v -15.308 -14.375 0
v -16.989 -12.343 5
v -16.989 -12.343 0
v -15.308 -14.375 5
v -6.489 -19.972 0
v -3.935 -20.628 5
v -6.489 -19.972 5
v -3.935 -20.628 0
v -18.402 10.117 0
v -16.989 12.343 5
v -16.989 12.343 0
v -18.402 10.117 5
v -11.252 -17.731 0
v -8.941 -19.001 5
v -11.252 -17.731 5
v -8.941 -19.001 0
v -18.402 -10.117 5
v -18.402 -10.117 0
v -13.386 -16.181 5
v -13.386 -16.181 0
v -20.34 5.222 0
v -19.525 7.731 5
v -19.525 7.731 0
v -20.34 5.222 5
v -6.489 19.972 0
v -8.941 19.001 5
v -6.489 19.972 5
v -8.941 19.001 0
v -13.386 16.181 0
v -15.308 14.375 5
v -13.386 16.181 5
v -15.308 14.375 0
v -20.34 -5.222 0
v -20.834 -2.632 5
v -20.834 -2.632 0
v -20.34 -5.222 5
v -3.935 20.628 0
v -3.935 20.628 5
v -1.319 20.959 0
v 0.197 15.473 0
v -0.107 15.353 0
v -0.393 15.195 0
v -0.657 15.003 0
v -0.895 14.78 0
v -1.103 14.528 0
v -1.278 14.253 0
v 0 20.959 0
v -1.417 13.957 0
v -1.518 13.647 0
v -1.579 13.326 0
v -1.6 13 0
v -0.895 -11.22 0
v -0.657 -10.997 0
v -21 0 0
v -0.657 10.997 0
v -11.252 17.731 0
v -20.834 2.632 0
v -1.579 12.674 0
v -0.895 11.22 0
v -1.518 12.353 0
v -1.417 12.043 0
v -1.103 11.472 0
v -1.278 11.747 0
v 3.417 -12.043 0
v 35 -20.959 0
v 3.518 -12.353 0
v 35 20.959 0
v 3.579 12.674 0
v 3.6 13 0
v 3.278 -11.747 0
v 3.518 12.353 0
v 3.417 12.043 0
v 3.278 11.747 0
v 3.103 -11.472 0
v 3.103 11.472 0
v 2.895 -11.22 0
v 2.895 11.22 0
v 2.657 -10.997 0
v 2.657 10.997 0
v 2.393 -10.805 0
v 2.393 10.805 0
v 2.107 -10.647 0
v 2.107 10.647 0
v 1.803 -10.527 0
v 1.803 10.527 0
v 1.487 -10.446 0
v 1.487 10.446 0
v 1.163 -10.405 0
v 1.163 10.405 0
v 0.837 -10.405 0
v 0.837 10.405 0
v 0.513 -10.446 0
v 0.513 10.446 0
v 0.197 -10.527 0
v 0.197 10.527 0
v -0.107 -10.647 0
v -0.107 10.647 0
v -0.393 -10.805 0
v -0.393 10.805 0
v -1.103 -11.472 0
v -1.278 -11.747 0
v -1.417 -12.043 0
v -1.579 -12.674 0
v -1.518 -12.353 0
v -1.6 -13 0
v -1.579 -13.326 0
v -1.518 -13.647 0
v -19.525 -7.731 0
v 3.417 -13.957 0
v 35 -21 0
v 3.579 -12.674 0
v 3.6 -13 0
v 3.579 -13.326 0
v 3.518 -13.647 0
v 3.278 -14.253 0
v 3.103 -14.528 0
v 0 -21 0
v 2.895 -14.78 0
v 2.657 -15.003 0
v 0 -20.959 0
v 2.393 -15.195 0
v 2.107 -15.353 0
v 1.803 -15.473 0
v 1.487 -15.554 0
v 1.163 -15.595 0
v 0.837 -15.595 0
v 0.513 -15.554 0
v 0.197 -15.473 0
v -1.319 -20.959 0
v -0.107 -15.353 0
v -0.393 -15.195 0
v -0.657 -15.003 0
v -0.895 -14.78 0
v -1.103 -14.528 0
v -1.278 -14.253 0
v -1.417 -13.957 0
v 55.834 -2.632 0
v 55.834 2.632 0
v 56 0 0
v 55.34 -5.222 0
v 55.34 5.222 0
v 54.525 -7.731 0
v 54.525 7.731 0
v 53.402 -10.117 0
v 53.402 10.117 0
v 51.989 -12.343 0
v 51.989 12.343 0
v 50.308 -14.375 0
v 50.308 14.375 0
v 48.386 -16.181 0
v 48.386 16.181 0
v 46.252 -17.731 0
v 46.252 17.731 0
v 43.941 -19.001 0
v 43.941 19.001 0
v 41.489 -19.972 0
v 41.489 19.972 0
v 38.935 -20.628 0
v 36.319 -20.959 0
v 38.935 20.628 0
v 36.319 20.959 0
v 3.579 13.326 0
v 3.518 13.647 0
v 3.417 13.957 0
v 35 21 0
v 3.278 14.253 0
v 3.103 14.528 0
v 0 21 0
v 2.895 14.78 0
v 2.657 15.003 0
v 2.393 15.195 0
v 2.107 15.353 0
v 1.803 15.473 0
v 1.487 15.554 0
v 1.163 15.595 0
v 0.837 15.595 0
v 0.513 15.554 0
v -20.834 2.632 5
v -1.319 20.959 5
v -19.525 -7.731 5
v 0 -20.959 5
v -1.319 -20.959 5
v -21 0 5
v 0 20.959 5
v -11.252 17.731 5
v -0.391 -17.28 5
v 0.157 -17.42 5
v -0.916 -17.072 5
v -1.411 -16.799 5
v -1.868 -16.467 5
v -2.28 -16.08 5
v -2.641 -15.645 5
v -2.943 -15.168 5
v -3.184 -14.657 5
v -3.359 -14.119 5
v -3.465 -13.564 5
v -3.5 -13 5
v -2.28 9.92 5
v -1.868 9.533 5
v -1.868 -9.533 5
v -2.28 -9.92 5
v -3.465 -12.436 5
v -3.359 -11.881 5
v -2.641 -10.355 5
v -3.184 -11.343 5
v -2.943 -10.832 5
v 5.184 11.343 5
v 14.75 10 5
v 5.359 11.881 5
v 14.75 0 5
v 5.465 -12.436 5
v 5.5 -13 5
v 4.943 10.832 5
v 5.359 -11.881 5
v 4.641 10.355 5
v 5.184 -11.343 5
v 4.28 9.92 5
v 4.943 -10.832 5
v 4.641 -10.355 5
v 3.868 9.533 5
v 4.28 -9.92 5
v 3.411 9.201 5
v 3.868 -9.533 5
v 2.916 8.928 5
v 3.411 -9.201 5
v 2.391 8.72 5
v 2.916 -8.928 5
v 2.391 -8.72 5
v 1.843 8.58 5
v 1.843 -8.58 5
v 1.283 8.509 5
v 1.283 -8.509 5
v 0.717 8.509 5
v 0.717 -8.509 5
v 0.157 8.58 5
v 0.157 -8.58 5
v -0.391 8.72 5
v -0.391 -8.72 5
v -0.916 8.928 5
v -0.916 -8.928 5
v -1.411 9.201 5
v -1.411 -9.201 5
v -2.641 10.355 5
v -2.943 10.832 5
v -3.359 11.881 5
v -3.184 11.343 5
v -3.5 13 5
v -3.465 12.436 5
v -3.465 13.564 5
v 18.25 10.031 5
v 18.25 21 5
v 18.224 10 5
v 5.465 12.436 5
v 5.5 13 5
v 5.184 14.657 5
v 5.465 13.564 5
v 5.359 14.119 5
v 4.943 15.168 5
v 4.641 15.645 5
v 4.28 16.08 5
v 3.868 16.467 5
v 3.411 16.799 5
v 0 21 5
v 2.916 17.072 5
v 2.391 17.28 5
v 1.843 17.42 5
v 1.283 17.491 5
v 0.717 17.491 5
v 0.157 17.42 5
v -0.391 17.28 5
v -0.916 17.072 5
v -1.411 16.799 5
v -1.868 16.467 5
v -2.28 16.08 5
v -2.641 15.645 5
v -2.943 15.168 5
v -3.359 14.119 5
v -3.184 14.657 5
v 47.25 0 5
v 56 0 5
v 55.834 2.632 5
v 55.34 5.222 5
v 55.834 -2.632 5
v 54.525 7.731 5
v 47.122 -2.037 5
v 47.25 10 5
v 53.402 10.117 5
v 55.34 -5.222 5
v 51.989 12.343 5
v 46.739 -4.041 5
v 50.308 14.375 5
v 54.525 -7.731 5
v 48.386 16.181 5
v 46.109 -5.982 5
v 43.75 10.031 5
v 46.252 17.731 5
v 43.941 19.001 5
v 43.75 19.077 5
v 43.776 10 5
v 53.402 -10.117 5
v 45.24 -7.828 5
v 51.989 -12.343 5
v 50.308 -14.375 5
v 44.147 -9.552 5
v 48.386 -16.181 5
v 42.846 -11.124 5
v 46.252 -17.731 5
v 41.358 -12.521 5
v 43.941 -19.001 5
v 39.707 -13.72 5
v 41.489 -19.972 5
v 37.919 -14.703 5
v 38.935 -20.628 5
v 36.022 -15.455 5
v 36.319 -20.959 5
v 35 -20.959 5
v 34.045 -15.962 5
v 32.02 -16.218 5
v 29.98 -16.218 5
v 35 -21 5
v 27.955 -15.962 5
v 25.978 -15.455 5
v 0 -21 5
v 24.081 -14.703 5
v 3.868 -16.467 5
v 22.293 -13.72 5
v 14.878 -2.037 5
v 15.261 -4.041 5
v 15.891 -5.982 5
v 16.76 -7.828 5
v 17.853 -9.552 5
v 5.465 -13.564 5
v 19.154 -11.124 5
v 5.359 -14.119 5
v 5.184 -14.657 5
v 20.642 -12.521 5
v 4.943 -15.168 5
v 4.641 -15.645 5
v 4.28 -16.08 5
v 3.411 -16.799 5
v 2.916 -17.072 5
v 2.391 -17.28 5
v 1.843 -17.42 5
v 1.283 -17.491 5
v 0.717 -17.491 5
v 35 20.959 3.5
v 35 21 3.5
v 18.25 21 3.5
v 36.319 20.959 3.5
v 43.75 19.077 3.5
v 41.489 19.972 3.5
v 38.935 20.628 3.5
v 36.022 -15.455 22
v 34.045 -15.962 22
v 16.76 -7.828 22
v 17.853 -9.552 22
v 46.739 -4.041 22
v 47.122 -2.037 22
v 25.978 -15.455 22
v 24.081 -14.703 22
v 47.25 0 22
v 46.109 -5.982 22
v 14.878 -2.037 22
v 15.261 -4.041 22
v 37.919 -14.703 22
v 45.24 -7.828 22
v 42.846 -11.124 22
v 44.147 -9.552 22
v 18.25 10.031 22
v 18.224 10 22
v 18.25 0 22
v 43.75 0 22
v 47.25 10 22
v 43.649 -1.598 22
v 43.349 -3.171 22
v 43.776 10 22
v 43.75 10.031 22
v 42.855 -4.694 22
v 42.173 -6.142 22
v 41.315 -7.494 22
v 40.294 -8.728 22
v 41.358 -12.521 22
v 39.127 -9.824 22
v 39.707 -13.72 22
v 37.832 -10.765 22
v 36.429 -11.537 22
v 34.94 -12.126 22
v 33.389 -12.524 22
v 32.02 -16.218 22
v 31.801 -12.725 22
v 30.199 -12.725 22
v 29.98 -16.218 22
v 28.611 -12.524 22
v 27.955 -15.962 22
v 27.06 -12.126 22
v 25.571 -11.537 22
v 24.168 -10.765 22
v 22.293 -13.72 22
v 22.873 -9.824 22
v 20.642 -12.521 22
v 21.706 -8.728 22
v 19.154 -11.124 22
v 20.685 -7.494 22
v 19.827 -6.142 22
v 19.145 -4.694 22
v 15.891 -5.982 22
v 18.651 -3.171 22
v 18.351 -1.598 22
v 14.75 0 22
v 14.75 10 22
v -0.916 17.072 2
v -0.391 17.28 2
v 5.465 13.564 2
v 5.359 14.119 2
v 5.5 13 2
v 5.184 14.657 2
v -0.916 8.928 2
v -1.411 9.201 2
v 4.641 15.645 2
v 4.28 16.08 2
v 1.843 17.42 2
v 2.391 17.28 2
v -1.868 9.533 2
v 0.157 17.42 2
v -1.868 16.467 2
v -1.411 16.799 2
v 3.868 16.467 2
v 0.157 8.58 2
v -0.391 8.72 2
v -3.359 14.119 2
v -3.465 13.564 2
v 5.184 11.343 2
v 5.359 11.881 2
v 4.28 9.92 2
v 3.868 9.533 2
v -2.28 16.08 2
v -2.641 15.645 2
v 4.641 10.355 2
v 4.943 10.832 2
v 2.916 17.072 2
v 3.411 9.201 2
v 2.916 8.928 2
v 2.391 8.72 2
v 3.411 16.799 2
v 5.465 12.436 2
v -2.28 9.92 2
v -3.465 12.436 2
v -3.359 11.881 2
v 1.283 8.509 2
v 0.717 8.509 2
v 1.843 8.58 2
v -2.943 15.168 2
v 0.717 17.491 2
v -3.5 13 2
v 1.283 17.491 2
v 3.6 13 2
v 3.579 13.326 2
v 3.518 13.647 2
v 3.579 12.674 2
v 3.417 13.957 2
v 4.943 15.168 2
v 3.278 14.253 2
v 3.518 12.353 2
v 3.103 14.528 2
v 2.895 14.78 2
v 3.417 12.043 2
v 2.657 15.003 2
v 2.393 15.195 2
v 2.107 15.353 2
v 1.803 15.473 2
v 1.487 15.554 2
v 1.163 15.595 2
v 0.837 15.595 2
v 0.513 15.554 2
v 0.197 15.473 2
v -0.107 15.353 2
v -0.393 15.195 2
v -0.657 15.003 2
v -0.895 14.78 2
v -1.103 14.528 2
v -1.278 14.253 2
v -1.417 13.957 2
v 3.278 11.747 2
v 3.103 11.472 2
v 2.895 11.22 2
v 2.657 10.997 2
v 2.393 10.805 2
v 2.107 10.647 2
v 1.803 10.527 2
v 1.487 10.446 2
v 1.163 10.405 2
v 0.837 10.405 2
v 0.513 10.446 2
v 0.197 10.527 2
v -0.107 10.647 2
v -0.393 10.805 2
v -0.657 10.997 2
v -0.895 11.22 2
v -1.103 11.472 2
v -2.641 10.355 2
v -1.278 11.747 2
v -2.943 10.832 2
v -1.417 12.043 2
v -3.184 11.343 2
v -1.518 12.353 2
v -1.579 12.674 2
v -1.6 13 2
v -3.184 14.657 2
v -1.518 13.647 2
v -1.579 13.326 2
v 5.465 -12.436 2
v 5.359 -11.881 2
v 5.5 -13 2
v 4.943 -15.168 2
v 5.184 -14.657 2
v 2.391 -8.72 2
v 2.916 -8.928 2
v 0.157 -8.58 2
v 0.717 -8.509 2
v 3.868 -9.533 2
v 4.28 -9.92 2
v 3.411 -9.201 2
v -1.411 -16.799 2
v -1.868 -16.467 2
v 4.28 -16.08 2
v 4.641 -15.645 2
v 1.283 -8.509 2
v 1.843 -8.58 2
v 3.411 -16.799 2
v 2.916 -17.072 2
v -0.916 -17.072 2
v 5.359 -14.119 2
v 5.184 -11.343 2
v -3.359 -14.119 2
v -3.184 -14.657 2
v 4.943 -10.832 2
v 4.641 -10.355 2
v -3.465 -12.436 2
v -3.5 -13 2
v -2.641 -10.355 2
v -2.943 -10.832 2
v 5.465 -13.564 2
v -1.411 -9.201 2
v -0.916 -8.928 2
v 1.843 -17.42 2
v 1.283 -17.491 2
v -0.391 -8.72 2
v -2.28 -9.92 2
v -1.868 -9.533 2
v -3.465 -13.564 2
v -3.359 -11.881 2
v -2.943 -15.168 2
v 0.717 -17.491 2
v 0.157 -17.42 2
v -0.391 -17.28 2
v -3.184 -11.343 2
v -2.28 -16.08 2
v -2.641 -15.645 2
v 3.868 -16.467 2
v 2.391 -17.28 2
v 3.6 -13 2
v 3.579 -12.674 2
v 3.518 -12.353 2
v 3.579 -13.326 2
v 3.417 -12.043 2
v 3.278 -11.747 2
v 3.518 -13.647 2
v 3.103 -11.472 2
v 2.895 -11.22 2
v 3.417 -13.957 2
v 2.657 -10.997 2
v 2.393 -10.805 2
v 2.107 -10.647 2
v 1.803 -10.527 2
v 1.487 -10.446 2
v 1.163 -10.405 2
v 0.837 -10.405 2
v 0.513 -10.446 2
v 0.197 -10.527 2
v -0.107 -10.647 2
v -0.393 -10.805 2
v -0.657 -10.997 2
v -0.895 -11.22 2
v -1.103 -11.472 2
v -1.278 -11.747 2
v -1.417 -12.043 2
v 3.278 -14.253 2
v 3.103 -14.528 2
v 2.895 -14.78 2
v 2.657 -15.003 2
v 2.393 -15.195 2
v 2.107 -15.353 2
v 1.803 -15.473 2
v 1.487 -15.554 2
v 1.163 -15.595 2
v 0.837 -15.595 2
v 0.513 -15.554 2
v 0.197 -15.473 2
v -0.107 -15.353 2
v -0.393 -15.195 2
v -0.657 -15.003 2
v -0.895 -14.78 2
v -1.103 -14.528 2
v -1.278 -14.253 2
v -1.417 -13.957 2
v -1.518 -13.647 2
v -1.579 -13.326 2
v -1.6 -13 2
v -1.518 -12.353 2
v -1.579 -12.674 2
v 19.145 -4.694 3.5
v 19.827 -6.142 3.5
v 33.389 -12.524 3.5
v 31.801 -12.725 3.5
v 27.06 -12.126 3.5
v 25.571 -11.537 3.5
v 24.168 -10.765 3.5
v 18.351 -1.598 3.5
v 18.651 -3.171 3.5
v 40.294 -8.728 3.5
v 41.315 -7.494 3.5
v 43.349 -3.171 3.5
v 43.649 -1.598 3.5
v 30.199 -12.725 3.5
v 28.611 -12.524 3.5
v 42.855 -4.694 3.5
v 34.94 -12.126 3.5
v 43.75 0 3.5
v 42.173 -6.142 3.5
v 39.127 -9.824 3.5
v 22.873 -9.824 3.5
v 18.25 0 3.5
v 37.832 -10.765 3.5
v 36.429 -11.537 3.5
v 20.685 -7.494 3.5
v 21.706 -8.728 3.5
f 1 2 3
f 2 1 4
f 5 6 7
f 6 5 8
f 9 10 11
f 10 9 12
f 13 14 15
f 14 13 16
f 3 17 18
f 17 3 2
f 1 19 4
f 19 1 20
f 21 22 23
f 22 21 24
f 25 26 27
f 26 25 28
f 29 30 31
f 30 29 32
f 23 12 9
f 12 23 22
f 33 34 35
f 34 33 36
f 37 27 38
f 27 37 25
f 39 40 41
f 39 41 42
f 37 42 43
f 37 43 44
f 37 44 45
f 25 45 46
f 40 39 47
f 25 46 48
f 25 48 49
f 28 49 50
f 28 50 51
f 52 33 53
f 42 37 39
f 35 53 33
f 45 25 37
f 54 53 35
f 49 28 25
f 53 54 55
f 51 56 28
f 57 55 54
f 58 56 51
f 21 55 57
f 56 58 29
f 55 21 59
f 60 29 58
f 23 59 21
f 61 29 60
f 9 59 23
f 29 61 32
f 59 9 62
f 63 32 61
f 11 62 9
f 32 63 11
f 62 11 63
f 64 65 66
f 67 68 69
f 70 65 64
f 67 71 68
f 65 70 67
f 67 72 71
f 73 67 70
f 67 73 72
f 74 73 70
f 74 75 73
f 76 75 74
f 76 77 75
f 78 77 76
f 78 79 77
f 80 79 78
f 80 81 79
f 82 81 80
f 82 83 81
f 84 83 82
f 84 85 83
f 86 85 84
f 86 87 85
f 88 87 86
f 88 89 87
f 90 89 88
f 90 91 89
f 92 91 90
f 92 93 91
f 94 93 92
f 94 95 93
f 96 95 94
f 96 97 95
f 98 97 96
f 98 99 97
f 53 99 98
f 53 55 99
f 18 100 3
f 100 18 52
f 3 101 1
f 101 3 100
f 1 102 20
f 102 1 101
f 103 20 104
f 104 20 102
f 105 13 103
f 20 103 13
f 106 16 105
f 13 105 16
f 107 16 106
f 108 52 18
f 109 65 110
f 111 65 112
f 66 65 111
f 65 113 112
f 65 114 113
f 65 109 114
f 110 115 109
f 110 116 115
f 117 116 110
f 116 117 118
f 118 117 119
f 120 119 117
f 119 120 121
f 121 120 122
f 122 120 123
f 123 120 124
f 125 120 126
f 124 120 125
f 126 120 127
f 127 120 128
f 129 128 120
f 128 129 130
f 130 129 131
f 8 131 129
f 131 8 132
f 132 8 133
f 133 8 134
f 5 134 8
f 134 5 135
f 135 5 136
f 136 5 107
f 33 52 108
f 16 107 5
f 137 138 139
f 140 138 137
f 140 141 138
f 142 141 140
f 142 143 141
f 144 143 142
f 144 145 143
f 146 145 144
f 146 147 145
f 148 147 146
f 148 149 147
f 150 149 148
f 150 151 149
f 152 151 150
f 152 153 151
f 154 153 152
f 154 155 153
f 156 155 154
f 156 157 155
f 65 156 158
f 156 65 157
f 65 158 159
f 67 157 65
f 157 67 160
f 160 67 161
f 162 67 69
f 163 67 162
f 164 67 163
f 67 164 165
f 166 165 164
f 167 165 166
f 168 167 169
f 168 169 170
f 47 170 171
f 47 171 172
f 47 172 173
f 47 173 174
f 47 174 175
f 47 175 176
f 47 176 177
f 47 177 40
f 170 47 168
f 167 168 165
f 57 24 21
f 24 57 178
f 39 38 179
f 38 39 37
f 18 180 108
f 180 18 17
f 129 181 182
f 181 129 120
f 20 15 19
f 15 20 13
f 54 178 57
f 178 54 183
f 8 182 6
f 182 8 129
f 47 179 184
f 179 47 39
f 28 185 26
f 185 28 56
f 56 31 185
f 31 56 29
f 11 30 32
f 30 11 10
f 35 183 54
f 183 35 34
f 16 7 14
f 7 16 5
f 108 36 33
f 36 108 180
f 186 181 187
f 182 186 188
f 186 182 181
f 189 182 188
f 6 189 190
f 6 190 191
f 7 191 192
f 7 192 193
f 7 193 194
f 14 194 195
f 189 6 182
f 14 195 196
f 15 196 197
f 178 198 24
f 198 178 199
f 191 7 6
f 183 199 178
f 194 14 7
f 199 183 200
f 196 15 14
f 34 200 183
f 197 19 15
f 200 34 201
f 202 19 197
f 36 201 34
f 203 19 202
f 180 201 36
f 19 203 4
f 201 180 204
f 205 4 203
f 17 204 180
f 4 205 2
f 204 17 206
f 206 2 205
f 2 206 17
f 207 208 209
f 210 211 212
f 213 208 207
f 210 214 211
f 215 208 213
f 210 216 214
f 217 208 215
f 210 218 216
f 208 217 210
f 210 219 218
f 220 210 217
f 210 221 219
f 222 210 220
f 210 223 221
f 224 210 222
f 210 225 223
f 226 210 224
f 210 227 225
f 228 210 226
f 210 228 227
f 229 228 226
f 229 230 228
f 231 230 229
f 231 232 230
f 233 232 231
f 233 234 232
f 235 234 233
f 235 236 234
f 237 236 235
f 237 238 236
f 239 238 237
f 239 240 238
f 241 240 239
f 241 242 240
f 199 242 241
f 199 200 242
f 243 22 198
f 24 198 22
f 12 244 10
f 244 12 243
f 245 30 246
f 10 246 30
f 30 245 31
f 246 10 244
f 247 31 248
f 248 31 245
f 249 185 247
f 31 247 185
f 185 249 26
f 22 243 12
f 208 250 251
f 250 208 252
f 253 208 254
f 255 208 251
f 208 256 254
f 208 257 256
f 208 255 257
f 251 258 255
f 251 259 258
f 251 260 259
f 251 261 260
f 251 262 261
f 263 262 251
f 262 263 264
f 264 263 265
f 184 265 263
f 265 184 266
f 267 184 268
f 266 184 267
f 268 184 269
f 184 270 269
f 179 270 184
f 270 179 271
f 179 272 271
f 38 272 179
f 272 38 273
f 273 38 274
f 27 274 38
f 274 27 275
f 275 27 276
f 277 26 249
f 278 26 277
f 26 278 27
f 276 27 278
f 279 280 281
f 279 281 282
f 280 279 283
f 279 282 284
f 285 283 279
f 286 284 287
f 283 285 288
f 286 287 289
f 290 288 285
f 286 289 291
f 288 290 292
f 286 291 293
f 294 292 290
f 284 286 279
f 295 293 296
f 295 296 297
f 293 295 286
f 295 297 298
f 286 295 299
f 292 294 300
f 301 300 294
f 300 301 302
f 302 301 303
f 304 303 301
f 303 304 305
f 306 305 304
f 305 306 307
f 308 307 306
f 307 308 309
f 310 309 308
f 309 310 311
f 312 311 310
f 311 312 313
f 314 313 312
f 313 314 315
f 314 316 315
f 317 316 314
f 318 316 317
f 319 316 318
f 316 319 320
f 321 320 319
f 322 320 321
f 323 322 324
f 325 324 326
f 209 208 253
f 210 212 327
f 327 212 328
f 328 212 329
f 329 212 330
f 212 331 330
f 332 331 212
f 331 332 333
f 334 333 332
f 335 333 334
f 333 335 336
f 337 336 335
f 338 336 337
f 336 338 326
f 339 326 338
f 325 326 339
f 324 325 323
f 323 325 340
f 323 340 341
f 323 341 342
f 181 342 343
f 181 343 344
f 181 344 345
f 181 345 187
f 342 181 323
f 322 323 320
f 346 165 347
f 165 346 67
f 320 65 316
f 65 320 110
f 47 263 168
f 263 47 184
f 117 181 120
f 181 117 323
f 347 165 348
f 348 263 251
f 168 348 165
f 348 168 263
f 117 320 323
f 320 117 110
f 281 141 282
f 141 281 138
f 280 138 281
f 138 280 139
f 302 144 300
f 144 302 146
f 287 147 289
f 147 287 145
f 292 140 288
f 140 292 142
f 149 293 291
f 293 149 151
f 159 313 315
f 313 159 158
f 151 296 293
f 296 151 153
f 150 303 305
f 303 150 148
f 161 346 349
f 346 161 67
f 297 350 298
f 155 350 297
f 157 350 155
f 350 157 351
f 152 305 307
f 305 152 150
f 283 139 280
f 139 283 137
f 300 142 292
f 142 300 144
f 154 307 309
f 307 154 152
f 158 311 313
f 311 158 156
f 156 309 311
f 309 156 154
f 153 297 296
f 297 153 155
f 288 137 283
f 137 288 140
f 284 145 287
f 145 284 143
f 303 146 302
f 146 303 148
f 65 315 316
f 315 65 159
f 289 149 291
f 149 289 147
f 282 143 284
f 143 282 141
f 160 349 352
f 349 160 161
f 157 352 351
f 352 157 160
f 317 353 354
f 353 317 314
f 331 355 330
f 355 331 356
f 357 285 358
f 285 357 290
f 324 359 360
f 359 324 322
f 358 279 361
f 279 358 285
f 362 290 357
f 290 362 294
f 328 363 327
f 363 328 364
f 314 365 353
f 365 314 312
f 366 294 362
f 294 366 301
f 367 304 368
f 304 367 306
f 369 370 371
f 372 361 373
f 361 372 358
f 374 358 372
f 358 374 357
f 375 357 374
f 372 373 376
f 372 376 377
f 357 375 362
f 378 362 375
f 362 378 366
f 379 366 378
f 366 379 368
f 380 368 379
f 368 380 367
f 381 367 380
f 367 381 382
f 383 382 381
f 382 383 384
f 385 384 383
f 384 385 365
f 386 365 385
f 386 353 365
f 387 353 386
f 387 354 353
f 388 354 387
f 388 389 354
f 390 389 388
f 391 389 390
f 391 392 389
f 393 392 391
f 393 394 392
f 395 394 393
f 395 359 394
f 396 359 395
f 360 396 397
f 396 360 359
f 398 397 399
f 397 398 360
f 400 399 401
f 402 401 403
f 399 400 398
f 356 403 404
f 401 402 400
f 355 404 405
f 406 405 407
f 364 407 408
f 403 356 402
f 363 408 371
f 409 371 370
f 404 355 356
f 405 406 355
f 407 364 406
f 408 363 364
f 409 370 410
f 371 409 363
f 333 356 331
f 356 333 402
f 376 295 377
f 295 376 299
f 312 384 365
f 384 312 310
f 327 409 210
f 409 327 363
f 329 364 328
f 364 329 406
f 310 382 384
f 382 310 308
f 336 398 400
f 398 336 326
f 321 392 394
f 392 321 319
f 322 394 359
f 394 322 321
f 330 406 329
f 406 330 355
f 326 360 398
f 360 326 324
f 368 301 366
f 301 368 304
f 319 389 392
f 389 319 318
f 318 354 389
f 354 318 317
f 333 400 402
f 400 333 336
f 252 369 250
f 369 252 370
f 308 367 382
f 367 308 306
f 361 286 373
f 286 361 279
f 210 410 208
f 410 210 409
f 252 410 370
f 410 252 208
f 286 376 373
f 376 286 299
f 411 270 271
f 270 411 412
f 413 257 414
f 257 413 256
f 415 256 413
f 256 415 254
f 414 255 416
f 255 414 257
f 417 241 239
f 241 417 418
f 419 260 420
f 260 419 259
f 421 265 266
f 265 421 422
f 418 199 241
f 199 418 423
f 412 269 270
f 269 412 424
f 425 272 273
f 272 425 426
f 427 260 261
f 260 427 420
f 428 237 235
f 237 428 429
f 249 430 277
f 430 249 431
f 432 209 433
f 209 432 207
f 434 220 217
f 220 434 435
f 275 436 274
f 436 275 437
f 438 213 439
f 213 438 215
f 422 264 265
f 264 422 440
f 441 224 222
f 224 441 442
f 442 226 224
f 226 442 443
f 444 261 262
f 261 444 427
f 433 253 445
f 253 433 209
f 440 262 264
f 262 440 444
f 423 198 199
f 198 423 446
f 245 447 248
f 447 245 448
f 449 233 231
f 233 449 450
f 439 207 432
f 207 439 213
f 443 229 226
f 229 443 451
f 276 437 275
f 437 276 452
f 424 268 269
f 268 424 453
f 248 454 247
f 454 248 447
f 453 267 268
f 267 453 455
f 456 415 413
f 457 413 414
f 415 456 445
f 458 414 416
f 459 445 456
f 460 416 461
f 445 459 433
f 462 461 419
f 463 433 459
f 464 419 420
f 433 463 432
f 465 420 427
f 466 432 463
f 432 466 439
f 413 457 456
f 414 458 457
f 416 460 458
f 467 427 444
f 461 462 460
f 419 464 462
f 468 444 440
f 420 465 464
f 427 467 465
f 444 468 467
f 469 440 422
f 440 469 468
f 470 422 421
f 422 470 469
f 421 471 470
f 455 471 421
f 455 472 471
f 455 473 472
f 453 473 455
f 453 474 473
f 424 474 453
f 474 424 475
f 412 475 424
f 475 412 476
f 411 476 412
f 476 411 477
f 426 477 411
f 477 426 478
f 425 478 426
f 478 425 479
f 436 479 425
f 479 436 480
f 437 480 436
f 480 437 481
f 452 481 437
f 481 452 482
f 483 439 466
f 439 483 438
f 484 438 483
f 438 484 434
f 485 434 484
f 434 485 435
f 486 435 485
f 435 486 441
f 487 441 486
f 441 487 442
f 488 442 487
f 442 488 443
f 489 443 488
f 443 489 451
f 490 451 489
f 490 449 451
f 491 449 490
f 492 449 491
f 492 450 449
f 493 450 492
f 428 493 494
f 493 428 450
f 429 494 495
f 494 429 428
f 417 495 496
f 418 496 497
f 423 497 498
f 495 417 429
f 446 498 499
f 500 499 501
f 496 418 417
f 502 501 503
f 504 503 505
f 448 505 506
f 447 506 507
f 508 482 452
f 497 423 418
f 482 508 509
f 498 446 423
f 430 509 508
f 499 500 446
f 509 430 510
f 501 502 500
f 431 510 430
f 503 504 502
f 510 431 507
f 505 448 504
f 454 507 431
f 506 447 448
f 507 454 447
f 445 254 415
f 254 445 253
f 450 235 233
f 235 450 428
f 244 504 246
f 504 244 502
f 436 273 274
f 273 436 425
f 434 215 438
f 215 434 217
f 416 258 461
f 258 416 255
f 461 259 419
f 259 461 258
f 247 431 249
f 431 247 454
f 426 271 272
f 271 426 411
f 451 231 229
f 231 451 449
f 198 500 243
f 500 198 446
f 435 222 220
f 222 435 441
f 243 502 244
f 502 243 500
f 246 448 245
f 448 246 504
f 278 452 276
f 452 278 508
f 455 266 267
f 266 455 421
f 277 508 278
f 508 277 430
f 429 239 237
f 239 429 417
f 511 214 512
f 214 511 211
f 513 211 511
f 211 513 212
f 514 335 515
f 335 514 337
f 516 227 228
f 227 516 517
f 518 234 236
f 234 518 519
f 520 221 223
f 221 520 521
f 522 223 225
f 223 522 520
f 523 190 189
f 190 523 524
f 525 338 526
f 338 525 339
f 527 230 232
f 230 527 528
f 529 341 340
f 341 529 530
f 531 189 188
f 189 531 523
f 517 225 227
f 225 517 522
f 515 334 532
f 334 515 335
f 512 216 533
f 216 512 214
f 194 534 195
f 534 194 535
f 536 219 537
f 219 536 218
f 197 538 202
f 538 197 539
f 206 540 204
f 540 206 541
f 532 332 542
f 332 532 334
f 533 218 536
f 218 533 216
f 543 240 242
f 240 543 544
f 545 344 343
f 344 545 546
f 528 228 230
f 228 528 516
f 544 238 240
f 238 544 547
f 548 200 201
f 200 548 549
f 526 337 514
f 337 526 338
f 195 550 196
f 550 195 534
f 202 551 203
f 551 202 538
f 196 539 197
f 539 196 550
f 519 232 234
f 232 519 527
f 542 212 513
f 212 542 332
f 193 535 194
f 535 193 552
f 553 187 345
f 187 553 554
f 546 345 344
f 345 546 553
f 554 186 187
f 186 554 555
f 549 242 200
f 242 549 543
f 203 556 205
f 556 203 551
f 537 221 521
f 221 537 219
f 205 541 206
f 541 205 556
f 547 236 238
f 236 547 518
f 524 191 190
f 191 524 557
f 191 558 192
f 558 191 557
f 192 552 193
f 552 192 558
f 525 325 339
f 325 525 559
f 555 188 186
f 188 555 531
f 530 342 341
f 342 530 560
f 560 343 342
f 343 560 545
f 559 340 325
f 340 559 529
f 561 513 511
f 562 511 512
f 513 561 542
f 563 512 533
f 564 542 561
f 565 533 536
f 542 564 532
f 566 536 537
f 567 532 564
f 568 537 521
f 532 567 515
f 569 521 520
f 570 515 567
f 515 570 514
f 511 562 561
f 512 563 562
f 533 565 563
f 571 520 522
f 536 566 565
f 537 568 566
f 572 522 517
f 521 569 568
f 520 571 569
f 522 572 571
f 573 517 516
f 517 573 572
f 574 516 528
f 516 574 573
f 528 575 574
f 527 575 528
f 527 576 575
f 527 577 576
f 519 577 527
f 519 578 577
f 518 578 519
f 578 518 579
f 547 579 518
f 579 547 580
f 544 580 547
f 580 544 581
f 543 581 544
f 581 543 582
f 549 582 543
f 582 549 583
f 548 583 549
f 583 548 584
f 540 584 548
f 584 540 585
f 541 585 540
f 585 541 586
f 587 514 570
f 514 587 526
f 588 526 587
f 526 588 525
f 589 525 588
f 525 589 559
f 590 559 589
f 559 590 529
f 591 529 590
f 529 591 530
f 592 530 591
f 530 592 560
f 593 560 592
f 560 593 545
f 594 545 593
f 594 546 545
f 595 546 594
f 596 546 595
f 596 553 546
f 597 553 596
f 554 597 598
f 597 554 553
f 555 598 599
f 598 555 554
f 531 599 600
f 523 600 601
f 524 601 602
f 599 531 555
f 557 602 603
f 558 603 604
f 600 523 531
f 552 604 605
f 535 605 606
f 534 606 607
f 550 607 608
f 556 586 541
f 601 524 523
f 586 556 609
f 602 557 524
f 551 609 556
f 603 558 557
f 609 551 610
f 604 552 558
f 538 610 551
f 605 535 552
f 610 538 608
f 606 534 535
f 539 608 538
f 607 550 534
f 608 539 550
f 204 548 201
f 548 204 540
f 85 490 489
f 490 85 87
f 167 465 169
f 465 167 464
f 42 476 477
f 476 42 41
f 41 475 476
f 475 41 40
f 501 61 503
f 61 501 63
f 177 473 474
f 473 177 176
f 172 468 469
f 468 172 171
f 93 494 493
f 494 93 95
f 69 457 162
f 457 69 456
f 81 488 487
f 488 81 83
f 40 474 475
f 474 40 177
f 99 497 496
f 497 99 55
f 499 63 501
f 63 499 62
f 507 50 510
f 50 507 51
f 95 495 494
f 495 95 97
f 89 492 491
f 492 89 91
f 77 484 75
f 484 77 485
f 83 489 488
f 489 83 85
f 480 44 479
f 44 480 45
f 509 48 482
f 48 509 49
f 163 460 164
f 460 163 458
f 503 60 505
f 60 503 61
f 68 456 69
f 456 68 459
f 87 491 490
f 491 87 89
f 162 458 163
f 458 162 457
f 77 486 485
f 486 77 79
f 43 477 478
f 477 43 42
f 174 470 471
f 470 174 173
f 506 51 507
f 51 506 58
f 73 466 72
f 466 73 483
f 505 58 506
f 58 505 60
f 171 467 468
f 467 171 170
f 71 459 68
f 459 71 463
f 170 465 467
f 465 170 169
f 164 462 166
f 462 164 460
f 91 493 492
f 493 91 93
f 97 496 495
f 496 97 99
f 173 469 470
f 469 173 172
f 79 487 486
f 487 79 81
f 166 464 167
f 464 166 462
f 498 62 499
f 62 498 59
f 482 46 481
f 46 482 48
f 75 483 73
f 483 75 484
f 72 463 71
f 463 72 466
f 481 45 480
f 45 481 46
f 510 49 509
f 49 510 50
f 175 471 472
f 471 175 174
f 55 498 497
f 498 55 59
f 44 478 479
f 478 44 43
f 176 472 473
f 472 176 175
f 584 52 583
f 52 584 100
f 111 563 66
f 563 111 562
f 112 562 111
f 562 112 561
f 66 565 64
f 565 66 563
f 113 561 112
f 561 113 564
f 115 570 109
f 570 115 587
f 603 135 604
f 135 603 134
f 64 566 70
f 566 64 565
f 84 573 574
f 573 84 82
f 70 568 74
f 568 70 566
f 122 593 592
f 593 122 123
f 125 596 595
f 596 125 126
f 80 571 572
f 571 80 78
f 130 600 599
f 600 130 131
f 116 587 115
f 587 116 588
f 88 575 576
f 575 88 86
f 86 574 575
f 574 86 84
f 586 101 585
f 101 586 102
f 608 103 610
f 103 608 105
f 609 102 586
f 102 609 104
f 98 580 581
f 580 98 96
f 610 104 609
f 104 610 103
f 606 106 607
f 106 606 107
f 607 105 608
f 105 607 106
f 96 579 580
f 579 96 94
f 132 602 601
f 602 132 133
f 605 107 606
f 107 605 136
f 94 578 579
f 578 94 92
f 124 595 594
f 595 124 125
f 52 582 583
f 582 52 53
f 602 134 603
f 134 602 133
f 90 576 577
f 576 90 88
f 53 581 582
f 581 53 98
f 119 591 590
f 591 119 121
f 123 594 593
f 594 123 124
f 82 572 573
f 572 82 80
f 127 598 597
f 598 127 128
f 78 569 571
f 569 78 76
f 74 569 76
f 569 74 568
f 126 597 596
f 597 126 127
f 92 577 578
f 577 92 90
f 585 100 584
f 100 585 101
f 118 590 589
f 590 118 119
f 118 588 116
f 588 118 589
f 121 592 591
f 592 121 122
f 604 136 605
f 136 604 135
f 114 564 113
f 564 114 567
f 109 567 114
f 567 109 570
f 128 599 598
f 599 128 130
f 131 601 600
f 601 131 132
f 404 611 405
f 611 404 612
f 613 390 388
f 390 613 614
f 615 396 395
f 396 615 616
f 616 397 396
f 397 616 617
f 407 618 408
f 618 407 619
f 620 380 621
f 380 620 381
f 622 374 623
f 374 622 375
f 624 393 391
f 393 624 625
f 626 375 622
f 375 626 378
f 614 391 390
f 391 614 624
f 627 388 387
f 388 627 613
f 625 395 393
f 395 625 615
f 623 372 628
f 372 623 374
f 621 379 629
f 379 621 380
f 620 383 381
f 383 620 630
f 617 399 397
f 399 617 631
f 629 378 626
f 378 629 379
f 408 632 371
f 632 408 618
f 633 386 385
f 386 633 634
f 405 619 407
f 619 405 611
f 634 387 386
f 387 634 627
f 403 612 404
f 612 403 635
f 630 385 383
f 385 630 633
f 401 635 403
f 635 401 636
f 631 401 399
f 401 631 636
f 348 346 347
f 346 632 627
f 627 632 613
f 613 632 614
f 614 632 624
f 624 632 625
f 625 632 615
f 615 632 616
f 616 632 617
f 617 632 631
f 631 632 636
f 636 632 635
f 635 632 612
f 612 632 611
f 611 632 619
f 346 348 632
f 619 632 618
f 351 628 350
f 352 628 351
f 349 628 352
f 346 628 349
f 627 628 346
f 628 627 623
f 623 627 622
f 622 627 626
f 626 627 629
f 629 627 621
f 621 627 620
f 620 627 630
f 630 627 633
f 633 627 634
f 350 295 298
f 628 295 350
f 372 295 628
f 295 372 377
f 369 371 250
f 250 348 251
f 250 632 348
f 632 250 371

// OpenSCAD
// Greetings from Heinrich Schnermann, Laatzen, Germany
//
// this is a replacement for the Ikea Hjälpa clothes rail holder
// 
// for right holder set leftpart to false

$fn =50;

leftpart = true;

difference() {
    union() {
        cylinder(5,  21, 21);
        translate([0, -21, 0]) cube([35, 42, 5]);
        translate([35, 0, 0]) cylinder(5, 21, 21);
        translate([31, 0, 0]) cylinder(22, 16.25, 16.25);
        if (leftpart) {
            translate([31 - 16.25, 0, 0]) cube([32.5, 10, 22]);
        } else {
            translate([31 - 16.25, - 10, 0]) cube([32.5, 10, 22]);
        }
    }
    translate([1, 13, 2]) cylinder(3.1, 4.5, 4.5);
    translate([1, -13, 2]) cylinder(3.1, 4.5, 4.5);
    translate([1, 13, -0.1]) cylinder(3, 5.2 / 2, 5.2 / 2);
    translate([1, -13, -0.1]) cylinder(3, 5.2 / 2, 5.2 / 2);
    translate([31, 0, 3.5]) cylinder(25, 12.75, 12.75);
    if (leftpart) {
        translate([31 - 12.75, 0, 3.5]) cube([25.5, 25, 22]);
    } else {
        translate([31 - 12.75, -25, 3.5]) cube([25.5, 25, 22]);
    }
}
